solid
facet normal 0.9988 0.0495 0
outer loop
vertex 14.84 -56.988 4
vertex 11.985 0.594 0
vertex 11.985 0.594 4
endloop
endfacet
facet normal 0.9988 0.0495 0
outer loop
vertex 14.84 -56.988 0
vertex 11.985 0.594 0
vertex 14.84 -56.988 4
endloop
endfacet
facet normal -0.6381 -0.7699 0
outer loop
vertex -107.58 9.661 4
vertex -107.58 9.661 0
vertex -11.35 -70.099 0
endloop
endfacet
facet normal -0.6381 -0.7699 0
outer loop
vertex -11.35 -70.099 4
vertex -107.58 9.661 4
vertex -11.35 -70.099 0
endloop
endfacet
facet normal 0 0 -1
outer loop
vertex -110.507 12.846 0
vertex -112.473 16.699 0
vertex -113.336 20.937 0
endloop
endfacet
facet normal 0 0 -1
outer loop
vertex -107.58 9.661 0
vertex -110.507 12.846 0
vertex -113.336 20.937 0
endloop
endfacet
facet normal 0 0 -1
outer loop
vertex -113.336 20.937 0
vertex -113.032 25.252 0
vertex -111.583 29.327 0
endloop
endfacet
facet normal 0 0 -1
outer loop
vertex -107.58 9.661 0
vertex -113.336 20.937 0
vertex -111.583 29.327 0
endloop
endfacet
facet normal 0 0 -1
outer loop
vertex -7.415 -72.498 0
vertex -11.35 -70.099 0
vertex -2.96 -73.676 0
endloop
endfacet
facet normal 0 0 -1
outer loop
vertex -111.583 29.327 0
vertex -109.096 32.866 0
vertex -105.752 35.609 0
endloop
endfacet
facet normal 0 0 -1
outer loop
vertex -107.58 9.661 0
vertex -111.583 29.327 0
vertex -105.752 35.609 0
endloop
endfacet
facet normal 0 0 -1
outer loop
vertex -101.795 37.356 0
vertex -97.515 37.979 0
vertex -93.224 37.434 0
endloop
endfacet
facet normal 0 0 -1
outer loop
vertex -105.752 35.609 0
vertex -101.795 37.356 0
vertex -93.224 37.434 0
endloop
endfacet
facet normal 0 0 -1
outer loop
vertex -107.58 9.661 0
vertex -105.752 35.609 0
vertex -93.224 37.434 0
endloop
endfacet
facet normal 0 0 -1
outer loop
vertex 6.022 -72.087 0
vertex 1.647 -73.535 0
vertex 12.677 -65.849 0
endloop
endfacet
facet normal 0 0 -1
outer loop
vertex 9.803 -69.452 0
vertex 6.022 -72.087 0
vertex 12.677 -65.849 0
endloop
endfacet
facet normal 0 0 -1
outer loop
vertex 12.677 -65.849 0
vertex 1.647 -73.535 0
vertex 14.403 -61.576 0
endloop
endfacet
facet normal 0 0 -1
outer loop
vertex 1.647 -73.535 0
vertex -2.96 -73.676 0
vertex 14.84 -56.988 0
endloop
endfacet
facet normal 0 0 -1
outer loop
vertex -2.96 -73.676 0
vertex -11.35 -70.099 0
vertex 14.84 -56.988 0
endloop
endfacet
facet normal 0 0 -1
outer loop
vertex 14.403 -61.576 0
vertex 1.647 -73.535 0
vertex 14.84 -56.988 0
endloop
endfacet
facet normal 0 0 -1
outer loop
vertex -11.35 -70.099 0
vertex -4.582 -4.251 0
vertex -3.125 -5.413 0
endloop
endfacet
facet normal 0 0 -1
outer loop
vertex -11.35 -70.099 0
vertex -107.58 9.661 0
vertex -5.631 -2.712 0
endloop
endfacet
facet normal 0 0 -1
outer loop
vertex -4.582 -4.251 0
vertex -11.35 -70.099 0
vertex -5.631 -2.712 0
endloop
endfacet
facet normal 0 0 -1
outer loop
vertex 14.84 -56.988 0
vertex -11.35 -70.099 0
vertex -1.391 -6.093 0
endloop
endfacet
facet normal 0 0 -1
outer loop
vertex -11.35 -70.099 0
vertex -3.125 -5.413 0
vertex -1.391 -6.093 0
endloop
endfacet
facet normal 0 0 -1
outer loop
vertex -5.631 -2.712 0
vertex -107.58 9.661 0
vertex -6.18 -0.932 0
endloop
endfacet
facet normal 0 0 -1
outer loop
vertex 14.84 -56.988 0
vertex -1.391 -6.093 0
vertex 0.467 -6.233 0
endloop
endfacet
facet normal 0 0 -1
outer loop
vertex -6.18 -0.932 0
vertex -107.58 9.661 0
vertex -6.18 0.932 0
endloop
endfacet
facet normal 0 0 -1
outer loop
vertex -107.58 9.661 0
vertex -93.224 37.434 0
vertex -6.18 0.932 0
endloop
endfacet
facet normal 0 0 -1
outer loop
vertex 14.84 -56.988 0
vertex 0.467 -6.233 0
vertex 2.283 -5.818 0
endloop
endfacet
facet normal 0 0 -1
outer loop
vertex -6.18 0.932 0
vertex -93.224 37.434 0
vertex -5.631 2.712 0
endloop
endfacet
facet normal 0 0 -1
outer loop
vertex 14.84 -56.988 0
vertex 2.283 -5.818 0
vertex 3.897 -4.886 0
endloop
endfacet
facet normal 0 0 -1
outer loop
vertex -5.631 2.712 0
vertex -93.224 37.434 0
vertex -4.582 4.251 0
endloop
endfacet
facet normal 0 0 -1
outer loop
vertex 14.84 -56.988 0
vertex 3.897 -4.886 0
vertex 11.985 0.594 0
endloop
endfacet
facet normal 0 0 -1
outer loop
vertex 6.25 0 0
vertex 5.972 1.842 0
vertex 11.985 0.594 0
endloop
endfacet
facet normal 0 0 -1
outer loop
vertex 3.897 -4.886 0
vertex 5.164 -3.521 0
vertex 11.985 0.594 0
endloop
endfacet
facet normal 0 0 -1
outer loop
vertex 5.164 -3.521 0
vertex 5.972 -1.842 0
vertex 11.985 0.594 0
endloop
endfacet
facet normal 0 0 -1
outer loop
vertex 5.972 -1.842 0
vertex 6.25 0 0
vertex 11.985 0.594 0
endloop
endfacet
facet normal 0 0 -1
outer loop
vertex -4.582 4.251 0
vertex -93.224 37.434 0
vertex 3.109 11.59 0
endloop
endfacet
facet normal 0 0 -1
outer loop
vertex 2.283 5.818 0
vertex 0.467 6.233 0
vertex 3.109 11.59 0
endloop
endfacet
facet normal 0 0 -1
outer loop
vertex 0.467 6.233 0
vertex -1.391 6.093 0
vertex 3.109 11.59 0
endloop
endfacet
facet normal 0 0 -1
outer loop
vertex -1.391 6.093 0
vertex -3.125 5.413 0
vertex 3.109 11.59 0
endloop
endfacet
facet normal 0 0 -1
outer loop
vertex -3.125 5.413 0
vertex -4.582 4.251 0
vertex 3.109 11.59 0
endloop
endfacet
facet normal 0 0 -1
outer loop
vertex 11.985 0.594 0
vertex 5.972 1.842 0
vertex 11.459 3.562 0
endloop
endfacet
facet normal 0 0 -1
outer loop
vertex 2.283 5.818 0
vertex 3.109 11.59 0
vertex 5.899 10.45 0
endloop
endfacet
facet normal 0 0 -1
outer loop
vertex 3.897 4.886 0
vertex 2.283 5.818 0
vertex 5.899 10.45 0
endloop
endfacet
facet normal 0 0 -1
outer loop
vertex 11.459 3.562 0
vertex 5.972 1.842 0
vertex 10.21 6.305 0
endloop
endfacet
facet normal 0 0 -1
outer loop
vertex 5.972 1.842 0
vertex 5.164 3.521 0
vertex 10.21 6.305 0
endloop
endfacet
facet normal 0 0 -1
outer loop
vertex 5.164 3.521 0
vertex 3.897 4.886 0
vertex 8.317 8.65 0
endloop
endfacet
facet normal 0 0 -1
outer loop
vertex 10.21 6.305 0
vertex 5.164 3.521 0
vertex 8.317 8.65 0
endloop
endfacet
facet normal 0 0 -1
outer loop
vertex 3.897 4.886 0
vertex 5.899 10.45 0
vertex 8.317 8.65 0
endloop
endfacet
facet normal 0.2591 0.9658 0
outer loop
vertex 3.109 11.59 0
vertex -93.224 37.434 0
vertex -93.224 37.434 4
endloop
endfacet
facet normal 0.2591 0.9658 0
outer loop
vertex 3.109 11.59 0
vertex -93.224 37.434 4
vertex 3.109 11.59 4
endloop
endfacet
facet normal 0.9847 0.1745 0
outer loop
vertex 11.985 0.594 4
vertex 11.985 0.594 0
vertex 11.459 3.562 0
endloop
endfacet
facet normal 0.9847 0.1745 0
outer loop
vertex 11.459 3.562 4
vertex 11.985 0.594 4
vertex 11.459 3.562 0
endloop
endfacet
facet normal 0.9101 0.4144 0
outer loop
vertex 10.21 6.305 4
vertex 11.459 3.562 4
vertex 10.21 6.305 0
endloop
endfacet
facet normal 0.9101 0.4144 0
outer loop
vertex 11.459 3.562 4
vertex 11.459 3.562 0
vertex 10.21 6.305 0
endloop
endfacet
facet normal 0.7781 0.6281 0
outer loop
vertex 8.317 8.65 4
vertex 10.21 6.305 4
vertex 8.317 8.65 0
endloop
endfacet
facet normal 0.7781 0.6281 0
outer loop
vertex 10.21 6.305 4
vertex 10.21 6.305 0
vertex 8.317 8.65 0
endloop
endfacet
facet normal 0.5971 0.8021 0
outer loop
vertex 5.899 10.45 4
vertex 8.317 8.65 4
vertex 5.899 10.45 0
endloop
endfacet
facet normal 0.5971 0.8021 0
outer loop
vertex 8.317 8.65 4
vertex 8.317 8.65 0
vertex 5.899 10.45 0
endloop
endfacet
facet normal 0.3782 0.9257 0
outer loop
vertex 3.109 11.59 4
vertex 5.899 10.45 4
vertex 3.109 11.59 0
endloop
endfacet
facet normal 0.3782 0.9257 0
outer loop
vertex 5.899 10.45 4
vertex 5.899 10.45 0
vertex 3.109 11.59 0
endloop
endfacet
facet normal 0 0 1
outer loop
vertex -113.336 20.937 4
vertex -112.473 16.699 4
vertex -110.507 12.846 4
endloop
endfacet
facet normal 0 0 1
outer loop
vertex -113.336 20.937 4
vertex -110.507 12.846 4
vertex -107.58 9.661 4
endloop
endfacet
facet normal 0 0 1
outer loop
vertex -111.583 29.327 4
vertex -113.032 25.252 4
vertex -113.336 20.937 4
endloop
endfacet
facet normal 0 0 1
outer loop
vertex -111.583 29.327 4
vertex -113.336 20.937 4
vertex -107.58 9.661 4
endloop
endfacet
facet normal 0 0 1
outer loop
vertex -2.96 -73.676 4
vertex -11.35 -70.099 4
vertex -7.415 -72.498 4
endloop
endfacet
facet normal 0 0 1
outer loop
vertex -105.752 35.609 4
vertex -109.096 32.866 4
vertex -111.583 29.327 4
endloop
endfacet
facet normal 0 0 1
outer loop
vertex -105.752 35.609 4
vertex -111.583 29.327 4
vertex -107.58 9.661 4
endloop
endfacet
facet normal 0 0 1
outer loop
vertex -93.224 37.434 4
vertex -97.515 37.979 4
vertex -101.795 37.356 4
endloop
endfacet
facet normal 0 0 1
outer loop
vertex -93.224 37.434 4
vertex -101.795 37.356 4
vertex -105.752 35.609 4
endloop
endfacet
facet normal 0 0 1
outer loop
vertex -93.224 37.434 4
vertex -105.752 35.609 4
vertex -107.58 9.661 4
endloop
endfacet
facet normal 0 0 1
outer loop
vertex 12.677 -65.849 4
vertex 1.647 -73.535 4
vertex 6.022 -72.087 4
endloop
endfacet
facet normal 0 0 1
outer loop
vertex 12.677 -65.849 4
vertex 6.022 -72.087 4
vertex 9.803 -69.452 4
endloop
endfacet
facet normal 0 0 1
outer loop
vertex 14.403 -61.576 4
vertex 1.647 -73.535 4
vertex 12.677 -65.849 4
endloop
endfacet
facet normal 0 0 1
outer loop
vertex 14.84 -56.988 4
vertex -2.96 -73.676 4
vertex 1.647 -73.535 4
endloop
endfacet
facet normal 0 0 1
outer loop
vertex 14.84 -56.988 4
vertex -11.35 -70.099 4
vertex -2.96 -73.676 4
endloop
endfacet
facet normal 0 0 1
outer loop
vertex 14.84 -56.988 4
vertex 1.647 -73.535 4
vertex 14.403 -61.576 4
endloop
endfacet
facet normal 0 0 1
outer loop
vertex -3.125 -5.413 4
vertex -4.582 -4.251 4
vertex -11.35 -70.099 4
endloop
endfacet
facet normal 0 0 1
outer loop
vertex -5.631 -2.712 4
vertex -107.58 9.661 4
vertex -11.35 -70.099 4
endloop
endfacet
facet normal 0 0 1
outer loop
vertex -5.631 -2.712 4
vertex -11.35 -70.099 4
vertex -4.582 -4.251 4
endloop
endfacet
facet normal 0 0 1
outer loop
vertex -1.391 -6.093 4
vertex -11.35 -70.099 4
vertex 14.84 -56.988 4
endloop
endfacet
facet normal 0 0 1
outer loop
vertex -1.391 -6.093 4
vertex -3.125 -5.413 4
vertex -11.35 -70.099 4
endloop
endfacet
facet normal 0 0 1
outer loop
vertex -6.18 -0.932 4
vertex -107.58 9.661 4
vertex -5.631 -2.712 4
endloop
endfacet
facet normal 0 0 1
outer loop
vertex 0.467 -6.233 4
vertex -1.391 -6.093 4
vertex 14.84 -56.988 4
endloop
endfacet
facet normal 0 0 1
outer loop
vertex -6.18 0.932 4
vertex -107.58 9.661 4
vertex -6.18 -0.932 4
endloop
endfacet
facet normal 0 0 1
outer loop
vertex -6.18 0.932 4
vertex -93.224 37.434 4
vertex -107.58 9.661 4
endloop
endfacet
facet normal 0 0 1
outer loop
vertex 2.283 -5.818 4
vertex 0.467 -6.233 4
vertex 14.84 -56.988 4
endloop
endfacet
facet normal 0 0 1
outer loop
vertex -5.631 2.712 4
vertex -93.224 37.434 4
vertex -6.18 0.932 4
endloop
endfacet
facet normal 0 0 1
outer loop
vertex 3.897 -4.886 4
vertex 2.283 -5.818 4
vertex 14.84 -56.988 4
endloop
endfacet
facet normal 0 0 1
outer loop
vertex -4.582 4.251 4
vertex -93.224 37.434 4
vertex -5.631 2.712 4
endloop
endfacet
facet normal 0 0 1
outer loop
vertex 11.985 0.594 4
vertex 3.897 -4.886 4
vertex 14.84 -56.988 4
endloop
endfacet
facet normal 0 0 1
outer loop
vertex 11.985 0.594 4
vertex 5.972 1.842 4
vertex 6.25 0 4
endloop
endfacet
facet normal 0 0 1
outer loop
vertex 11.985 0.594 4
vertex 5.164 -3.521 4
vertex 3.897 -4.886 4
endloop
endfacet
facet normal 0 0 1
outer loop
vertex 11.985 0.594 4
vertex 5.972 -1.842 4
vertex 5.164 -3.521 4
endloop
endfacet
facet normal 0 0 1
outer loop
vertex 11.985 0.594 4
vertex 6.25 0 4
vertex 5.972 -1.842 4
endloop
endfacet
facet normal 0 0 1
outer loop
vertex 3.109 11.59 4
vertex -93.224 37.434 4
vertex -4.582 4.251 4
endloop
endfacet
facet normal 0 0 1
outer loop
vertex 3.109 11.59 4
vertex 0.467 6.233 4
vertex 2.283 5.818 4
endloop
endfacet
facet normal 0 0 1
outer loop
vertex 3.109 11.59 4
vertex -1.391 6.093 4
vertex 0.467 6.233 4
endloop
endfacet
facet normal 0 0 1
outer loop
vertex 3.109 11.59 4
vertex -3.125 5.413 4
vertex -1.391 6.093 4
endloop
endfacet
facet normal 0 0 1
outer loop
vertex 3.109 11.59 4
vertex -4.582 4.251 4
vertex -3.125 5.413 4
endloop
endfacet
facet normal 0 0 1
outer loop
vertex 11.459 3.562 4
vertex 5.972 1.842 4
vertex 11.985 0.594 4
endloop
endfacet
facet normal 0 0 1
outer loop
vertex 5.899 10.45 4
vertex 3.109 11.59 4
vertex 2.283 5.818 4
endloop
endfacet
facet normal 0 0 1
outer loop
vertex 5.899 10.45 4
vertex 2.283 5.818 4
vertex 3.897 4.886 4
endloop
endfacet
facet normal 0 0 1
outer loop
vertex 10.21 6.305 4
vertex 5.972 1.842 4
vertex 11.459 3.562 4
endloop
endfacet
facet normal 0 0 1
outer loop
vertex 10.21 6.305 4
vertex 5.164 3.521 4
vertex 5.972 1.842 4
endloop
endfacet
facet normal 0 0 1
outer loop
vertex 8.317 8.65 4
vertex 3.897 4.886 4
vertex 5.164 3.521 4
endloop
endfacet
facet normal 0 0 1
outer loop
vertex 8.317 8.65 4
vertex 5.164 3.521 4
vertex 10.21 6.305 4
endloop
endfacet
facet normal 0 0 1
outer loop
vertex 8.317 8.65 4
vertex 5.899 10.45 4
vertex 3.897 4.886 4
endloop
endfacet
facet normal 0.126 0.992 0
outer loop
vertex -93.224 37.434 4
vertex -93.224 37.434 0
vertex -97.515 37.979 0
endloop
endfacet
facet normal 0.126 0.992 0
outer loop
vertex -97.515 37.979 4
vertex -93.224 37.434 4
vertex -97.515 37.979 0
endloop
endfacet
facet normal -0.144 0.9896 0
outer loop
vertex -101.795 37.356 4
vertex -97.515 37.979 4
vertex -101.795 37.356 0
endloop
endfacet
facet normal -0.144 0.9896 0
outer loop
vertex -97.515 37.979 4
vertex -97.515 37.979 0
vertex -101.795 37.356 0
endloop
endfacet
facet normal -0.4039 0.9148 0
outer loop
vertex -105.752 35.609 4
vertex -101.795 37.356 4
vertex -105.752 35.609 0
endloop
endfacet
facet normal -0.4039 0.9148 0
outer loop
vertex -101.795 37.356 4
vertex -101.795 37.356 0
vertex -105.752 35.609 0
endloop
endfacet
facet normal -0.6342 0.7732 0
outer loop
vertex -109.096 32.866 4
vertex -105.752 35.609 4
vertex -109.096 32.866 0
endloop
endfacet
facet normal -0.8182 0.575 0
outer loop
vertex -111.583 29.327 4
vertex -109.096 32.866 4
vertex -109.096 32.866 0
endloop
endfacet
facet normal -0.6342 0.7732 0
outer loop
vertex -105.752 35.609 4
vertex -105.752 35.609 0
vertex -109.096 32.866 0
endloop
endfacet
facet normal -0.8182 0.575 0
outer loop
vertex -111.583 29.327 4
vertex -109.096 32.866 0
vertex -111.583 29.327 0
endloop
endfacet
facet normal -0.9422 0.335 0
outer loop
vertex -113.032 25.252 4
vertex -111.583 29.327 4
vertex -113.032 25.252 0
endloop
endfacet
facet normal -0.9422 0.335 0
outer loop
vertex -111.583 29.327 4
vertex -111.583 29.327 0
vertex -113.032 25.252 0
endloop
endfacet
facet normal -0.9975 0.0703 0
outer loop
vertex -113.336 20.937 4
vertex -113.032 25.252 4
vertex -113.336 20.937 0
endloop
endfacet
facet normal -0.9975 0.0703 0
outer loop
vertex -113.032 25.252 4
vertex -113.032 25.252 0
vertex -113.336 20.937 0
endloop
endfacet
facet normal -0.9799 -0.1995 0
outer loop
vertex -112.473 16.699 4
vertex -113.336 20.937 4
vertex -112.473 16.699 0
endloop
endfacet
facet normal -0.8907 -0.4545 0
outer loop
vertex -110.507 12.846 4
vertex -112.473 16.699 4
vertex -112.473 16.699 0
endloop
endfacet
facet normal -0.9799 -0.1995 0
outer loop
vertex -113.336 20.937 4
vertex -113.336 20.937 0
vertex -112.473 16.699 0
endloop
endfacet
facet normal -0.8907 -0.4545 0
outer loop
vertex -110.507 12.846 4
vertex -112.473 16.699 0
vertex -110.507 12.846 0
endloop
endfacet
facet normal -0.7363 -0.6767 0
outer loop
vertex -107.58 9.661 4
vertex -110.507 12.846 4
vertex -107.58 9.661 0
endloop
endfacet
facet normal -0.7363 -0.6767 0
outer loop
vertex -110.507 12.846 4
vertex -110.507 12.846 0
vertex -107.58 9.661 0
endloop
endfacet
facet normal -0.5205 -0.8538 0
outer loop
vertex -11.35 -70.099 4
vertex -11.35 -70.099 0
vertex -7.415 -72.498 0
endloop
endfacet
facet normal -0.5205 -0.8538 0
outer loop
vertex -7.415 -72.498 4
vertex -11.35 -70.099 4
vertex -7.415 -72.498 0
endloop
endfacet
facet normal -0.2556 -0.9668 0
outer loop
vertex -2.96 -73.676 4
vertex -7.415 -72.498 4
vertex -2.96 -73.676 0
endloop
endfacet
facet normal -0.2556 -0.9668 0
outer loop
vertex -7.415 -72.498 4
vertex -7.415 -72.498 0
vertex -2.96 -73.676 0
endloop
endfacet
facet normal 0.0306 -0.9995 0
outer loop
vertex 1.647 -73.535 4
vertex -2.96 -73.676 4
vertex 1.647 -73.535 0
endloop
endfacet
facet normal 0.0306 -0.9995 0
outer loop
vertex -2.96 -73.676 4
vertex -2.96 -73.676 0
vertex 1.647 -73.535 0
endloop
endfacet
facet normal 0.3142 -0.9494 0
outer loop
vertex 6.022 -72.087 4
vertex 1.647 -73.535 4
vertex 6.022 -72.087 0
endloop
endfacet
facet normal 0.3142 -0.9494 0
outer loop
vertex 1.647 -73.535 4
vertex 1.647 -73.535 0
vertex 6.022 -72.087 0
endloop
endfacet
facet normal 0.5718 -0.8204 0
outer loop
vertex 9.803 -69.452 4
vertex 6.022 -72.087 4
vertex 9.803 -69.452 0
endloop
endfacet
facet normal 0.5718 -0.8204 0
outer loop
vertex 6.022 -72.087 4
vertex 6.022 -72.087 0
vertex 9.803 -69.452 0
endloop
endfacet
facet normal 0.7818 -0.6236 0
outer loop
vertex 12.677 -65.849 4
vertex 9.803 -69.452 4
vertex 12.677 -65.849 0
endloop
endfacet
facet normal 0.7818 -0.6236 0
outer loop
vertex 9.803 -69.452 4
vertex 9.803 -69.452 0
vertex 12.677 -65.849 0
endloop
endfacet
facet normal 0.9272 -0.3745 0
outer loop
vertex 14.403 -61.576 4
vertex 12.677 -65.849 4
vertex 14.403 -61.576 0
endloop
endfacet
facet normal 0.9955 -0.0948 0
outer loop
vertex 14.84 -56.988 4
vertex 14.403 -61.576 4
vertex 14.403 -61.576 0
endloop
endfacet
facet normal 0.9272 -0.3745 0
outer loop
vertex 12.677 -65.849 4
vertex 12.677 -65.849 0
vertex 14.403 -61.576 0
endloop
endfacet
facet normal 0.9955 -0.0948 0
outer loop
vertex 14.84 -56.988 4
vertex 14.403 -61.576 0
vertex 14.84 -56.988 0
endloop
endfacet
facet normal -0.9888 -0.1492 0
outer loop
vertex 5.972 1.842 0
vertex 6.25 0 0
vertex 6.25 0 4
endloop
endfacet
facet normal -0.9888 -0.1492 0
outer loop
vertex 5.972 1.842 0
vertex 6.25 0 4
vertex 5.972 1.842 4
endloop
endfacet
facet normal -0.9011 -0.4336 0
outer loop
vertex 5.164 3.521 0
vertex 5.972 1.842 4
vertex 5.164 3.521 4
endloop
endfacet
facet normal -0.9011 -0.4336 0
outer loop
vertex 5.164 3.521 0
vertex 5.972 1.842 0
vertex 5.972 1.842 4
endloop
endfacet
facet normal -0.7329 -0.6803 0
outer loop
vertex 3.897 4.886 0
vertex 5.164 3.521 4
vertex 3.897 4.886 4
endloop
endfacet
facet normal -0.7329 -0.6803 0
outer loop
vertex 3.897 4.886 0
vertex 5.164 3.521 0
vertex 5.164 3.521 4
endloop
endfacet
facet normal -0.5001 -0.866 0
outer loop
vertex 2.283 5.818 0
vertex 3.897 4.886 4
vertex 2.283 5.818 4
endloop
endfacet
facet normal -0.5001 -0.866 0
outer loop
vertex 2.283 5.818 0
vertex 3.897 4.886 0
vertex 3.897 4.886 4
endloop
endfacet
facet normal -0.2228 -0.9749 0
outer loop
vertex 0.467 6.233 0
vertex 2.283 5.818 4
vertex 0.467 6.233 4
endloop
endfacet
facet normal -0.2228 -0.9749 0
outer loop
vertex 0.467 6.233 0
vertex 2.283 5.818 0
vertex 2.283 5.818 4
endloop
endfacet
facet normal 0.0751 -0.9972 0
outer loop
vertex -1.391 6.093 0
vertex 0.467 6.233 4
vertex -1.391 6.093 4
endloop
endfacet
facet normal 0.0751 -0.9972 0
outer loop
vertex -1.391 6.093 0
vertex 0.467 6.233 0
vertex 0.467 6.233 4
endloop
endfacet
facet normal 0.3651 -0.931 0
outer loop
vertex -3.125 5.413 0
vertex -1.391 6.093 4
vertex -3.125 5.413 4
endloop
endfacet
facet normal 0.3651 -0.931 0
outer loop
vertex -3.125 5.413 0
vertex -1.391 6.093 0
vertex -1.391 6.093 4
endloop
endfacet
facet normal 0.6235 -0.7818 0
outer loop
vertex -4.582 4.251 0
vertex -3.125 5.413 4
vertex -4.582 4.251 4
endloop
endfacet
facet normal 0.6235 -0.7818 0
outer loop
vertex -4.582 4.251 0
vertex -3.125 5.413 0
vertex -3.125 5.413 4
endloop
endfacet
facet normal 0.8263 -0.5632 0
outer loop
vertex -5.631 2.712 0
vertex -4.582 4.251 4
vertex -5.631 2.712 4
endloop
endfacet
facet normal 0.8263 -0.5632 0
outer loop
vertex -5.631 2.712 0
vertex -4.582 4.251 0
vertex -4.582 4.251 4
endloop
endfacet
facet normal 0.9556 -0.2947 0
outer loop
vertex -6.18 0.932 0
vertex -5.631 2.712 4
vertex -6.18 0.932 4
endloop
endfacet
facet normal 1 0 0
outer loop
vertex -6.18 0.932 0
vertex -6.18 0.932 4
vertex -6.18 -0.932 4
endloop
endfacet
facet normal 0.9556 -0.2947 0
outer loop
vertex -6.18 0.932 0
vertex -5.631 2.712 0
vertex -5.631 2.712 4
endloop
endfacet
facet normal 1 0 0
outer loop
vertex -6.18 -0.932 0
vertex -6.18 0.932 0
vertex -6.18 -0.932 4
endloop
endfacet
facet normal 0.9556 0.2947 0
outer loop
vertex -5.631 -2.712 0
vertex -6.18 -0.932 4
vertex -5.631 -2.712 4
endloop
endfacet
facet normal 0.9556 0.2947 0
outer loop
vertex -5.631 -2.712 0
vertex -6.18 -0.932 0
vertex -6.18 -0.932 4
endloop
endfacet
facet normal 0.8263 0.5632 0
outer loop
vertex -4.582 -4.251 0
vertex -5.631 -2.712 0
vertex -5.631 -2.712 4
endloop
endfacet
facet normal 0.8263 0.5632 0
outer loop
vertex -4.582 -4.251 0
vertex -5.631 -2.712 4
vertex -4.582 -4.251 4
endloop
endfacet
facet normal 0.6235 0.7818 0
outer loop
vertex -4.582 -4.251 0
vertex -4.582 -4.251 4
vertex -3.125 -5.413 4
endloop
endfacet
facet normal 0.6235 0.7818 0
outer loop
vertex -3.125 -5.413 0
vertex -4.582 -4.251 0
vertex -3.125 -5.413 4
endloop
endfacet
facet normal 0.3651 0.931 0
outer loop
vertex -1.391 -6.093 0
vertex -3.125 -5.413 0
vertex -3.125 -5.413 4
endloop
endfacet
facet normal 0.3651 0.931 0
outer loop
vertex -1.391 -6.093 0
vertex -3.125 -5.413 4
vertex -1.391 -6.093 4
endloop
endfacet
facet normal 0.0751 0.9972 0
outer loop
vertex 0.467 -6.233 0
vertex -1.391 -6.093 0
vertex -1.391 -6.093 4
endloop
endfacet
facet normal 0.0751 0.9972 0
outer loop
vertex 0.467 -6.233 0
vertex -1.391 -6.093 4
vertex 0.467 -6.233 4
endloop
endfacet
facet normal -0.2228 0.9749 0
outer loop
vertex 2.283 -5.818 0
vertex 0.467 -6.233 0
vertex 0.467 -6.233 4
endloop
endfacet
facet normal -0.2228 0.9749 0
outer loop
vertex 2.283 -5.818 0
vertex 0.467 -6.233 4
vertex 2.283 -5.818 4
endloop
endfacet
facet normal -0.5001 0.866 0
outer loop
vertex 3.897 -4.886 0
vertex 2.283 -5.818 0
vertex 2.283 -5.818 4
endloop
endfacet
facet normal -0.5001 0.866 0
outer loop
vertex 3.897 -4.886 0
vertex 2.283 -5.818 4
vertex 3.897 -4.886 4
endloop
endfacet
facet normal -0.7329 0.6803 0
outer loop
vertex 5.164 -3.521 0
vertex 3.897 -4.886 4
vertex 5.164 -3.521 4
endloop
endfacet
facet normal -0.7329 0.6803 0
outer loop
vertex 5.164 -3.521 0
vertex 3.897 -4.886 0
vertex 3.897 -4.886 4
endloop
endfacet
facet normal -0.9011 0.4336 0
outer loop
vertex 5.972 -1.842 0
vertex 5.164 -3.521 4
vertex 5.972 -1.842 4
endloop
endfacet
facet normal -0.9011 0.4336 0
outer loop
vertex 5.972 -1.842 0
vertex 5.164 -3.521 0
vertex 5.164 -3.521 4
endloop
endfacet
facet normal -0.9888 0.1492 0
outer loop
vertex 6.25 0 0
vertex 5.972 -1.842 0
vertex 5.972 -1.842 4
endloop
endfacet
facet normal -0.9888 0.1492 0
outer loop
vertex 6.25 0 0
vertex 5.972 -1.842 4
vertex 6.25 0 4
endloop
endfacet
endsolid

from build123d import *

# Parameters (mm, degrees)
SKETCH_R  = 6.25
PAD_DEPTH = 4


with BuildPart() as part:
    # Sketch → Pad (new body)
    with BuildSketch(Plane.XY):
        with BuildLine():
            ThreePointArc((-93.224272, 37.433574), (-111.583346, 29.327163), (-107.580303, 9.661326))
            Line((-107.580303, 9.661326), (-11.350303, -70.098674))
            ThreePointArc((-11.350303, -70.098674), (6.022276, -72.087404), (14.840368, -56.987643))
            Line((11.985276, 0.594268), (14.840368, -56.987643))
            ThreePointArc((11.985276, 0.594268), (9.337508, 7.537304), (3.109296, 11.59018))
            Line((-93.224272, 37.433574), (3.109296, 11.59018))
        make_face()
        Circle(SKETCH_R, mode=Mode.SUBTRACT)
    extrude(amount=PAD_DEPTH)


solid = part.part
